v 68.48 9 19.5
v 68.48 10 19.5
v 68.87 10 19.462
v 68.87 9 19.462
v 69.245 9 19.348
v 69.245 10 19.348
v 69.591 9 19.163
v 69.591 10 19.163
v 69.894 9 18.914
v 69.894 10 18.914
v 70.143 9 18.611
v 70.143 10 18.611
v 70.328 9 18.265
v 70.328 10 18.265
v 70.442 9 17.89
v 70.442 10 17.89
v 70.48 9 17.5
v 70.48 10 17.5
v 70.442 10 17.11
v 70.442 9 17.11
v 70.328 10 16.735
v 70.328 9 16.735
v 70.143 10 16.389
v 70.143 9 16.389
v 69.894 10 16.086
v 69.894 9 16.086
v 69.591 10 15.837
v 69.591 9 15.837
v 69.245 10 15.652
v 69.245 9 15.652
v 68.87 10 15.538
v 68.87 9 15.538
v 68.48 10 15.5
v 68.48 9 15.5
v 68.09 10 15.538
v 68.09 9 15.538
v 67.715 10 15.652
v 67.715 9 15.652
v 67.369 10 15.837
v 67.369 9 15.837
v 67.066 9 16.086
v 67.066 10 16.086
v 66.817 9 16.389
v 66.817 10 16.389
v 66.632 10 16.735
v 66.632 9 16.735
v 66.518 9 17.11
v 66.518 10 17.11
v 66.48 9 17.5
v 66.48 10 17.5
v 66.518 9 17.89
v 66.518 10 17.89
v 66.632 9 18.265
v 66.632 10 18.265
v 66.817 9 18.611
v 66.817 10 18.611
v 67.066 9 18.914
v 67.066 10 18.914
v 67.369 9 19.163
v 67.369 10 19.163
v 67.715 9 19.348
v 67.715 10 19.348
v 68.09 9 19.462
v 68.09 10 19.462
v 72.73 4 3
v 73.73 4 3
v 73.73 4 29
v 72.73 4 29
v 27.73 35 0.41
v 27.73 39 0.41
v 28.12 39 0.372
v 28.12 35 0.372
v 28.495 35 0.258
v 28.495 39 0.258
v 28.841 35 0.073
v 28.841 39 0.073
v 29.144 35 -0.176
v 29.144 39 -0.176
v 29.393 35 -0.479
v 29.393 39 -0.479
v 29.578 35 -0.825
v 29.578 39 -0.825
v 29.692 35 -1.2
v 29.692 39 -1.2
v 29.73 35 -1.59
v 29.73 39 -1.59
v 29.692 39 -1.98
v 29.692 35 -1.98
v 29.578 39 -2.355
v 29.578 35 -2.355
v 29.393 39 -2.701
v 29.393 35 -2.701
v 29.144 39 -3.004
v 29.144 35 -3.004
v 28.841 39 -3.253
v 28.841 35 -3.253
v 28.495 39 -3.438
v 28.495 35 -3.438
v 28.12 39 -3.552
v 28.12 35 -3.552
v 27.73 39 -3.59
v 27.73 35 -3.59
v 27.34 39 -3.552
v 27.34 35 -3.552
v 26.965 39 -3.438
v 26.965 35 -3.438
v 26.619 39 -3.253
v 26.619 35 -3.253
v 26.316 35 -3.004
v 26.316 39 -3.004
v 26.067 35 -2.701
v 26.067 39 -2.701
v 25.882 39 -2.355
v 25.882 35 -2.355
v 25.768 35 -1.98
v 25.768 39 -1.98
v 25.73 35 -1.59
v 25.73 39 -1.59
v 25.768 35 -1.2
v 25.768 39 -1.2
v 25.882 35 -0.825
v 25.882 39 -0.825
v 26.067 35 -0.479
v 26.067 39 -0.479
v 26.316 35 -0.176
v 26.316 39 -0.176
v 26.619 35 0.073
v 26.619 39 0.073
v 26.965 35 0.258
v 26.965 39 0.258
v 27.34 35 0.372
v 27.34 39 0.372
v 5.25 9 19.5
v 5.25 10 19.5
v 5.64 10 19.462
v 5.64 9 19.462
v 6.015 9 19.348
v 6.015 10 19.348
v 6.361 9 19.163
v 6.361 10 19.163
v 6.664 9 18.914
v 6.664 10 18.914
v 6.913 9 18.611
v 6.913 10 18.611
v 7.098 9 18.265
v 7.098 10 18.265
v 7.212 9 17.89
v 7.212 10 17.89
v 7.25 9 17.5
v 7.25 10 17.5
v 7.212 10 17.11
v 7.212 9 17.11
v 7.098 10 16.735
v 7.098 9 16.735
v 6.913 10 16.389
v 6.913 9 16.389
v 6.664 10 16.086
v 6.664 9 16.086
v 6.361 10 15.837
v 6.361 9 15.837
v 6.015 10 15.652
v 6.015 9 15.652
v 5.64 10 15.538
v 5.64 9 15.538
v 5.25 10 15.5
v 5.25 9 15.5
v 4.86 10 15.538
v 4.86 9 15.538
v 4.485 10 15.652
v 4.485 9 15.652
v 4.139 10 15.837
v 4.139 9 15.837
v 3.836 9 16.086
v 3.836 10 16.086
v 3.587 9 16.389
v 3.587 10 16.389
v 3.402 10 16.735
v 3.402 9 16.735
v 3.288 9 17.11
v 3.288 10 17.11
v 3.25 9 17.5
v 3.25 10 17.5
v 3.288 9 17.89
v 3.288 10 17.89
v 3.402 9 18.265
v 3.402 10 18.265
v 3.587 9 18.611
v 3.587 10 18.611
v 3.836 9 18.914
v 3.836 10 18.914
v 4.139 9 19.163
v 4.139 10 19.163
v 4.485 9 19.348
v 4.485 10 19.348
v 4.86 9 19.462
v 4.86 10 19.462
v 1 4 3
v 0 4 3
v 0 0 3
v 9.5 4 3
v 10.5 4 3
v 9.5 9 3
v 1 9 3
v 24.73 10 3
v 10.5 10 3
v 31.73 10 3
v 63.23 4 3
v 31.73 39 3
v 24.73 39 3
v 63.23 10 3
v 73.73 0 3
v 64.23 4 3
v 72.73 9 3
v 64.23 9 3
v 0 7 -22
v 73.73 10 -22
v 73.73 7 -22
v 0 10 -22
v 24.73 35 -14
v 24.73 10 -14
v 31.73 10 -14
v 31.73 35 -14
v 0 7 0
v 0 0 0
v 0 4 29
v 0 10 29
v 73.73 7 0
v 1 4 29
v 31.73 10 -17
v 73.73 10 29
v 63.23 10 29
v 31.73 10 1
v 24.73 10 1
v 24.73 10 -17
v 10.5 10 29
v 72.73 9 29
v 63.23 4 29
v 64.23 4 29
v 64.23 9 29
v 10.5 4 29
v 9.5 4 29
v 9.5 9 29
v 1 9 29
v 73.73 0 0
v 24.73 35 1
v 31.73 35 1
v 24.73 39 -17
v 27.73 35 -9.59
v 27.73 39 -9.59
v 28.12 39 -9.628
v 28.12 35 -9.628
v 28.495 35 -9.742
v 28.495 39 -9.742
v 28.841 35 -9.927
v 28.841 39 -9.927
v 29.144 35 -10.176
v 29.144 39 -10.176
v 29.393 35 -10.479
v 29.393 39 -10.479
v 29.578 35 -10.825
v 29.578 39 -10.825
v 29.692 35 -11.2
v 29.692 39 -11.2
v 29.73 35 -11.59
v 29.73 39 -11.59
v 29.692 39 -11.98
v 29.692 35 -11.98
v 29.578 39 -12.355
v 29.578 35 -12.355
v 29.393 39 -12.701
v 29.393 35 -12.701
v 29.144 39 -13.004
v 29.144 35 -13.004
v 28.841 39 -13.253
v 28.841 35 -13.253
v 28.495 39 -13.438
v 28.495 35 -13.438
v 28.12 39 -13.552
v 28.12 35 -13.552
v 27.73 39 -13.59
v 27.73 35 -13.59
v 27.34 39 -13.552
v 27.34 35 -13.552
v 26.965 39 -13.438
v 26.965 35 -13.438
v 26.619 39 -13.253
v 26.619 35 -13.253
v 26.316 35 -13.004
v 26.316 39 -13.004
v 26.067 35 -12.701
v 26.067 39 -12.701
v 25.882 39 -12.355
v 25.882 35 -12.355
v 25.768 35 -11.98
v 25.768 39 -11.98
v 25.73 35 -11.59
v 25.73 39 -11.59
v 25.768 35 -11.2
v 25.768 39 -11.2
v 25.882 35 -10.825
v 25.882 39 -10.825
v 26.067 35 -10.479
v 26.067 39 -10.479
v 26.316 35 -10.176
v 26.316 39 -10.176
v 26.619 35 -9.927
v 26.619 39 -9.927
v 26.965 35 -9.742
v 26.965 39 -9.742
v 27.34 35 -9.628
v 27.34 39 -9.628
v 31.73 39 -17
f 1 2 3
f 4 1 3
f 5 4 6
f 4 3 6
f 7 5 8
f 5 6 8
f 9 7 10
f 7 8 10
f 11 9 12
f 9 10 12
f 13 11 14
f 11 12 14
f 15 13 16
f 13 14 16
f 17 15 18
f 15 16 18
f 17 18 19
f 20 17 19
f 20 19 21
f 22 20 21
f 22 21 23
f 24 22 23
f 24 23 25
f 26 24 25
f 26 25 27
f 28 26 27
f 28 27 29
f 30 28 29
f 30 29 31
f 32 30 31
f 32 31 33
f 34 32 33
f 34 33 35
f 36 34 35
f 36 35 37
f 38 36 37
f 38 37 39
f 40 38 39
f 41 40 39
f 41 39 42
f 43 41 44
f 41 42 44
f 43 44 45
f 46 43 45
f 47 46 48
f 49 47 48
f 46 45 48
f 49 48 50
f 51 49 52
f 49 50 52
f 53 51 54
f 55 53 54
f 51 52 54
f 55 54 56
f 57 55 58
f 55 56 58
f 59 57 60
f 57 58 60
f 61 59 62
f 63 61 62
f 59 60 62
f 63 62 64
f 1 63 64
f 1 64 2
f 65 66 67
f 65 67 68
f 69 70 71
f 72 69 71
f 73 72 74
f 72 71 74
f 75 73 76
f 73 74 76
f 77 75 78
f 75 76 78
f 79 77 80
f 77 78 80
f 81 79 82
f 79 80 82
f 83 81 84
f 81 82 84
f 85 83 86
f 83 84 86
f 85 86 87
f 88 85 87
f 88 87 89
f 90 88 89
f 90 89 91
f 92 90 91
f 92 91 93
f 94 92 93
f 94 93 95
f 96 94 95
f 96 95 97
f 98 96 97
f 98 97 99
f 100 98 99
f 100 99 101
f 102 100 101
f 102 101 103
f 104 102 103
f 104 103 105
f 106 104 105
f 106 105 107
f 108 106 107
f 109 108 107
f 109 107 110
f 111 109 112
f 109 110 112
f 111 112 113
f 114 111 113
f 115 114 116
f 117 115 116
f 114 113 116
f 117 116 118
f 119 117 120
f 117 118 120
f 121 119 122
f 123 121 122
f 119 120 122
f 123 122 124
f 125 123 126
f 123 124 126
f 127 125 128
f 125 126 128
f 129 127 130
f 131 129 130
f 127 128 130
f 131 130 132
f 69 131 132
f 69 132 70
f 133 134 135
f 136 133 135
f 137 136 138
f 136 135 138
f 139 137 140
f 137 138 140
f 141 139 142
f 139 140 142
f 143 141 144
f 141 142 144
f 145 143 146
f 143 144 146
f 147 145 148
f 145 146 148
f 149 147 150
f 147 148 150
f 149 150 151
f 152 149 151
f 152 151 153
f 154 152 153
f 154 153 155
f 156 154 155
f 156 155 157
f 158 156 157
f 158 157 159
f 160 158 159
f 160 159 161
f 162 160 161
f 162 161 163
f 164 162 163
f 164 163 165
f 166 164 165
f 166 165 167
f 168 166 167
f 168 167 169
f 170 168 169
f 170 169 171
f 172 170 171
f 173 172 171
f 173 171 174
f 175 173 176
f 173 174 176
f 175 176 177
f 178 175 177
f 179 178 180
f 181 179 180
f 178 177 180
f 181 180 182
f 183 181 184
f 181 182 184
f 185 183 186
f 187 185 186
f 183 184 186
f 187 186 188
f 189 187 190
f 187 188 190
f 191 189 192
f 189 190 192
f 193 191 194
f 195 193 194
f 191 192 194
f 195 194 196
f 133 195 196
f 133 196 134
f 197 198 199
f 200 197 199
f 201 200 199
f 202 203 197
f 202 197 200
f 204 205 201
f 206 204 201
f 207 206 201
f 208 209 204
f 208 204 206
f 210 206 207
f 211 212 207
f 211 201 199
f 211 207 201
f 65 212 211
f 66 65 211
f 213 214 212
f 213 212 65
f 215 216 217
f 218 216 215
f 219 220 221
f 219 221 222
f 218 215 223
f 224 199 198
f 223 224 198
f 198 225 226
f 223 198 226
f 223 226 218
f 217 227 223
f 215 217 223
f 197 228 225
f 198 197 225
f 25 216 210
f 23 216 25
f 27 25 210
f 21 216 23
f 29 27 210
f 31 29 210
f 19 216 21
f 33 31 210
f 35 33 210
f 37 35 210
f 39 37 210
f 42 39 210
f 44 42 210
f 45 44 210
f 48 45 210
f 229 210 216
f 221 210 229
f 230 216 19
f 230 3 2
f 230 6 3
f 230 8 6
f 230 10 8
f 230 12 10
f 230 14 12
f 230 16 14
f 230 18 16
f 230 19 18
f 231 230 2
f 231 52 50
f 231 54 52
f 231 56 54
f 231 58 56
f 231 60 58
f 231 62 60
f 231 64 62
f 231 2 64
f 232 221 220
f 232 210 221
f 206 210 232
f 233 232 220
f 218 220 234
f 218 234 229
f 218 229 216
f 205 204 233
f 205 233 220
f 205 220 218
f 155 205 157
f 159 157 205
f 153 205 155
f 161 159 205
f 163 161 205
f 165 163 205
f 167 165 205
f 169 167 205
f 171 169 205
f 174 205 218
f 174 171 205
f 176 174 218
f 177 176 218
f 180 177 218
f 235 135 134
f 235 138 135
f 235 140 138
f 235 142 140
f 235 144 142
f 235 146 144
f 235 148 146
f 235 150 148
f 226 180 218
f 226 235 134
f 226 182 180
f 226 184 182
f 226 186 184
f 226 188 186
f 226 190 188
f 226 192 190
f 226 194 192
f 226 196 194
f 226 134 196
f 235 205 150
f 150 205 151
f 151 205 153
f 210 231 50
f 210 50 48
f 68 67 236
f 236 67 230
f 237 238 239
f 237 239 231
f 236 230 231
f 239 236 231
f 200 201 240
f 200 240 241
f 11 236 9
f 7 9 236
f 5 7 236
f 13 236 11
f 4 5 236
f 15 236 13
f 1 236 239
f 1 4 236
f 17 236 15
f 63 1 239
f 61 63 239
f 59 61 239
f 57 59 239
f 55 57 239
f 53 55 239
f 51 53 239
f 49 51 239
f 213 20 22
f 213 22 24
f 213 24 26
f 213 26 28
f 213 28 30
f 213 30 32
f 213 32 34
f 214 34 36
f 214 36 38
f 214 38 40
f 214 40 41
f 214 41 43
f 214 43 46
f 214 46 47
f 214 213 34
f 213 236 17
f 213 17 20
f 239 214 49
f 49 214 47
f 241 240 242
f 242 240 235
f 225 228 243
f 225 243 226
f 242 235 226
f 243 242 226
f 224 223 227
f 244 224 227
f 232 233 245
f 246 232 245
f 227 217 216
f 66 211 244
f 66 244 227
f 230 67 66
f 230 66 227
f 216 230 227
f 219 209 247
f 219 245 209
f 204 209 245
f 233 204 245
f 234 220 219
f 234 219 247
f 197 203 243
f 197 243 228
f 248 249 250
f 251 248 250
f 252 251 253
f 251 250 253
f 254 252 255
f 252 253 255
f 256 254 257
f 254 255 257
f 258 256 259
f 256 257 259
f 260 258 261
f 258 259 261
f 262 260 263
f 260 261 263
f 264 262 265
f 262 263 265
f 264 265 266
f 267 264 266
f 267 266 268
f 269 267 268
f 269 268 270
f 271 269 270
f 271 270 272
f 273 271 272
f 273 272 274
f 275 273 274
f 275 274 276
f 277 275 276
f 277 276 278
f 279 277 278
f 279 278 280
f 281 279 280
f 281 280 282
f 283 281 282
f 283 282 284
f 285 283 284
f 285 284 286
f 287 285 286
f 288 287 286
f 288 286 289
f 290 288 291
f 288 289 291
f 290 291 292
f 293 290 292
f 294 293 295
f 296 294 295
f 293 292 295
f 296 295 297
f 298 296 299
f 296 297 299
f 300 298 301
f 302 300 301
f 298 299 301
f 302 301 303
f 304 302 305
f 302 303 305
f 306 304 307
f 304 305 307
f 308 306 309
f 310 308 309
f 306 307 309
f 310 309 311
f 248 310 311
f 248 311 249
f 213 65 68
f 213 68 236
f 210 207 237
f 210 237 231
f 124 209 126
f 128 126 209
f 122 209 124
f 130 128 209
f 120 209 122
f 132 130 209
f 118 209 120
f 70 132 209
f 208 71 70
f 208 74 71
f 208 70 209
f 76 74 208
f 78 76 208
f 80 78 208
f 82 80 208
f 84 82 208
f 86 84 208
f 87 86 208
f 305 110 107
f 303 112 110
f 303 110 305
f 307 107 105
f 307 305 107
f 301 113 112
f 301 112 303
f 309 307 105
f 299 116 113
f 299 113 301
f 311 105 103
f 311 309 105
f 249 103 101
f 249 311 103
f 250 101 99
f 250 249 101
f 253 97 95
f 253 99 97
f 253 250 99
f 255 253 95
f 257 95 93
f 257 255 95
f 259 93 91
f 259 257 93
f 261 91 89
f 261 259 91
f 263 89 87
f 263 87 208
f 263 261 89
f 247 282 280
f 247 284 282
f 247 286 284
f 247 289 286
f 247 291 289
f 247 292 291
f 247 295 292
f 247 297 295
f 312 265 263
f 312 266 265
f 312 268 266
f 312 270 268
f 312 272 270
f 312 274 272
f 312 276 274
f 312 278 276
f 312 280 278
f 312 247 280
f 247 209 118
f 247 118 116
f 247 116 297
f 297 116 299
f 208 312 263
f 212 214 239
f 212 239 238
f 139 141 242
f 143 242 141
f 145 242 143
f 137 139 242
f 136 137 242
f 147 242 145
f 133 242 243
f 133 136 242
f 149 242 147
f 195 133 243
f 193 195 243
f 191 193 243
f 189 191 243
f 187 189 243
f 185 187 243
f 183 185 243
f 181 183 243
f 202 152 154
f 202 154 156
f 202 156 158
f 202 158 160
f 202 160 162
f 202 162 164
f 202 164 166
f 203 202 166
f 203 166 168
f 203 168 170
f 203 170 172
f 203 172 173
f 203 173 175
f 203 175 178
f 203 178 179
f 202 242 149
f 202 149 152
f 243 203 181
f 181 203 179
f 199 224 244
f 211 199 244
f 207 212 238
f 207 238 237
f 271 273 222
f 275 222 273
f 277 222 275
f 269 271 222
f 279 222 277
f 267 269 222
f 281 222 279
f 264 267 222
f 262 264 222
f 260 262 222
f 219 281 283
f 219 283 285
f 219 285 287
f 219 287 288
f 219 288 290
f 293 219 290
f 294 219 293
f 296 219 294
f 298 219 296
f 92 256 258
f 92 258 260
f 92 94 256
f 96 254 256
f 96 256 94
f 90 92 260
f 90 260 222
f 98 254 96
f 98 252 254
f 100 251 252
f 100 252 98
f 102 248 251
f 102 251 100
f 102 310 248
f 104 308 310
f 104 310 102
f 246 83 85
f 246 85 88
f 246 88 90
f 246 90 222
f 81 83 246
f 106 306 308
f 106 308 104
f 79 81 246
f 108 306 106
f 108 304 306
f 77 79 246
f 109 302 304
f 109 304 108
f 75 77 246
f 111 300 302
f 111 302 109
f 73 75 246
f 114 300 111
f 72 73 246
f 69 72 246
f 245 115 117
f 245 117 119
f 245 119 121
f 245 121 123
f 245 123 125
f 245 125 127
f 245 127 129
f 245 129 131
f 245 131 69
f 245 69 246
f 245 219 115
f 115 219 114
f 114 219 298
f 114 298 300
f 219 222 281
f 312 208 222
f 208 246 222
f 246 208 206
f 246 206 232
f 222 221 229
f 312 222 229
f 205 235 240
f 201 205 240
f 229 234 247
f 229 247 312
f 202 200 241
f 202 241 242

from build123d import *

# Parameters (mm, degrees)
SKETCH1_W           = 73.73
SKETCH1_H           = 10
BOSS_EXTRUDE1_DEPTH = 3
BOSS_EXTRUDE2_DEPTH = 26
BOSS_EXTRUDE3_DEPTH = 26
SKETCH8_R           = 2
CUT_EXTRUDE1_DEPTH  = 80.85682751
SKETCH10_W          = 73.73
SKETCH10_H          = 3
BOSS_EXTRUDE4_DEPTH = 22
SKETCH11_W          = 7
SKETCH11_H          = 20
BOSS_EXTRUDE5_DEPTH = 29
SKETCH12_R          = 2
CUT_EXTRUDE2_DEPTH  = 10
SKETCH13_W          = 15
SKETCH13_H          = 25
CUT_EXTRUDE3_DEPTH  = 70.014491232


with BuildPart() as part:
    # Sketch1 → Boss-Extrude1 (new body)
    with BuildSketch(Plane.XY):
        with Locations((36.865, 5)):
            Rectangle(SKETCH1_W, SKETCH1_H)
    extrude(amount=BOSS_EXTRUDE1_DEPTH)

    # Sketch2 → Boss-Extrude2 (add)
    with BuildSketch(Plane.XY.offset(3)):
        Polygon((0, 4), (0, 10), (10.5, 10), (10.5, 4), (9.5, 4), (9.5, 9), (1, 9), (1, 4), align=None)
    extrude(amount=BOSS_EXTRUDE2_DEPTH)

    # Sketch7 → Boss-Extrude3 (add)
    with BuildSketch(Plane.XY.offset(3)):
        Polygon((73.73, 10), (73.73, 4), (72.73, 4), (72.73, 9), (64.23, 9), (64.23, 4), (63.23, 4), (63.23, 10), align=None)
    extrude(amount=BOSS_EXTRUDE3_DEPTH)

    # Sketch8 → Cut-Extrude1 (cut, through all)
    with BuildSketch(Plane(origin=(0, 10, 0), x_dir=(1, 0, 0), z_dir=(0, 1, 0))):
        with Locations(Location((5.25, -17.5, 0), (0, 0, 270))):
            Circle(SKETCH8_R)
        with Locations(Location((68.48, -17.5, 0), (0, 0, 270))):
            Circle(SKETCH8_R)
    extrude(amount=-CUT_EXTRUDE1_DEPTH, mode=Mode.SUBTRACT)

    # Sketch10 → Boss-Extrude4 (add)
    with BuildSketch(Plane(origin=(0, 0, 0), x_dir=(-1, 0, 0), z_dir=(0, 0, -1))):
        with Locations((-36.865, 8.5)):
            Rectangle(SKETCH10_W, SKETCH10_H)
    extrude(amount=BOSS_EXTRUDE4_DEPTH)

    # Sketch11 → Boss-Extrude5 (add)
    with BuildSketch(Plane(origin=(0, 10, 0), x_dir=(1, 0, 0), z_dir=(0, 1, 0))):
        with Locations((28.23, 7)):
            Rectangle(SKETCH11_W, SKETCH11_H)
    extrude(amount=BOSS_EXTRUDE5_DEPTH)

    # Sketch12 → Cut-Extrude2 (cut)
    with BuildSketch(Plane(origin=(0, 39, 0), x_dir=(1, 0, 0), z_dir=(0, 1, 0))):
        with Locations(Location((27.73, 11.59, 0), (0, 0, 270))):
            Circle(SKETCH12_R)
        with Locations(Location((27.73, 1.59, 0), (0, 0, 270))):
            Circle(SKETCH12_R)
    extrude(amount=-CUT_EXTRUDE2_DEPTH, mode=Mode.SUBTRACT)

    # Sketch13 → Cut-Extrude3 (cut, through all)
    with BuildSketch(Plane.ZY.offset(-24.73)):
        with Locations((-6.5, 22.5)):
            Rectangle(SKETCH13_W, SKETCH13_H)
    extrude(amount=-CUT_EXTRUDE3_DEPTH, mode=Mode.SUBTRACT)


solid = part.part
